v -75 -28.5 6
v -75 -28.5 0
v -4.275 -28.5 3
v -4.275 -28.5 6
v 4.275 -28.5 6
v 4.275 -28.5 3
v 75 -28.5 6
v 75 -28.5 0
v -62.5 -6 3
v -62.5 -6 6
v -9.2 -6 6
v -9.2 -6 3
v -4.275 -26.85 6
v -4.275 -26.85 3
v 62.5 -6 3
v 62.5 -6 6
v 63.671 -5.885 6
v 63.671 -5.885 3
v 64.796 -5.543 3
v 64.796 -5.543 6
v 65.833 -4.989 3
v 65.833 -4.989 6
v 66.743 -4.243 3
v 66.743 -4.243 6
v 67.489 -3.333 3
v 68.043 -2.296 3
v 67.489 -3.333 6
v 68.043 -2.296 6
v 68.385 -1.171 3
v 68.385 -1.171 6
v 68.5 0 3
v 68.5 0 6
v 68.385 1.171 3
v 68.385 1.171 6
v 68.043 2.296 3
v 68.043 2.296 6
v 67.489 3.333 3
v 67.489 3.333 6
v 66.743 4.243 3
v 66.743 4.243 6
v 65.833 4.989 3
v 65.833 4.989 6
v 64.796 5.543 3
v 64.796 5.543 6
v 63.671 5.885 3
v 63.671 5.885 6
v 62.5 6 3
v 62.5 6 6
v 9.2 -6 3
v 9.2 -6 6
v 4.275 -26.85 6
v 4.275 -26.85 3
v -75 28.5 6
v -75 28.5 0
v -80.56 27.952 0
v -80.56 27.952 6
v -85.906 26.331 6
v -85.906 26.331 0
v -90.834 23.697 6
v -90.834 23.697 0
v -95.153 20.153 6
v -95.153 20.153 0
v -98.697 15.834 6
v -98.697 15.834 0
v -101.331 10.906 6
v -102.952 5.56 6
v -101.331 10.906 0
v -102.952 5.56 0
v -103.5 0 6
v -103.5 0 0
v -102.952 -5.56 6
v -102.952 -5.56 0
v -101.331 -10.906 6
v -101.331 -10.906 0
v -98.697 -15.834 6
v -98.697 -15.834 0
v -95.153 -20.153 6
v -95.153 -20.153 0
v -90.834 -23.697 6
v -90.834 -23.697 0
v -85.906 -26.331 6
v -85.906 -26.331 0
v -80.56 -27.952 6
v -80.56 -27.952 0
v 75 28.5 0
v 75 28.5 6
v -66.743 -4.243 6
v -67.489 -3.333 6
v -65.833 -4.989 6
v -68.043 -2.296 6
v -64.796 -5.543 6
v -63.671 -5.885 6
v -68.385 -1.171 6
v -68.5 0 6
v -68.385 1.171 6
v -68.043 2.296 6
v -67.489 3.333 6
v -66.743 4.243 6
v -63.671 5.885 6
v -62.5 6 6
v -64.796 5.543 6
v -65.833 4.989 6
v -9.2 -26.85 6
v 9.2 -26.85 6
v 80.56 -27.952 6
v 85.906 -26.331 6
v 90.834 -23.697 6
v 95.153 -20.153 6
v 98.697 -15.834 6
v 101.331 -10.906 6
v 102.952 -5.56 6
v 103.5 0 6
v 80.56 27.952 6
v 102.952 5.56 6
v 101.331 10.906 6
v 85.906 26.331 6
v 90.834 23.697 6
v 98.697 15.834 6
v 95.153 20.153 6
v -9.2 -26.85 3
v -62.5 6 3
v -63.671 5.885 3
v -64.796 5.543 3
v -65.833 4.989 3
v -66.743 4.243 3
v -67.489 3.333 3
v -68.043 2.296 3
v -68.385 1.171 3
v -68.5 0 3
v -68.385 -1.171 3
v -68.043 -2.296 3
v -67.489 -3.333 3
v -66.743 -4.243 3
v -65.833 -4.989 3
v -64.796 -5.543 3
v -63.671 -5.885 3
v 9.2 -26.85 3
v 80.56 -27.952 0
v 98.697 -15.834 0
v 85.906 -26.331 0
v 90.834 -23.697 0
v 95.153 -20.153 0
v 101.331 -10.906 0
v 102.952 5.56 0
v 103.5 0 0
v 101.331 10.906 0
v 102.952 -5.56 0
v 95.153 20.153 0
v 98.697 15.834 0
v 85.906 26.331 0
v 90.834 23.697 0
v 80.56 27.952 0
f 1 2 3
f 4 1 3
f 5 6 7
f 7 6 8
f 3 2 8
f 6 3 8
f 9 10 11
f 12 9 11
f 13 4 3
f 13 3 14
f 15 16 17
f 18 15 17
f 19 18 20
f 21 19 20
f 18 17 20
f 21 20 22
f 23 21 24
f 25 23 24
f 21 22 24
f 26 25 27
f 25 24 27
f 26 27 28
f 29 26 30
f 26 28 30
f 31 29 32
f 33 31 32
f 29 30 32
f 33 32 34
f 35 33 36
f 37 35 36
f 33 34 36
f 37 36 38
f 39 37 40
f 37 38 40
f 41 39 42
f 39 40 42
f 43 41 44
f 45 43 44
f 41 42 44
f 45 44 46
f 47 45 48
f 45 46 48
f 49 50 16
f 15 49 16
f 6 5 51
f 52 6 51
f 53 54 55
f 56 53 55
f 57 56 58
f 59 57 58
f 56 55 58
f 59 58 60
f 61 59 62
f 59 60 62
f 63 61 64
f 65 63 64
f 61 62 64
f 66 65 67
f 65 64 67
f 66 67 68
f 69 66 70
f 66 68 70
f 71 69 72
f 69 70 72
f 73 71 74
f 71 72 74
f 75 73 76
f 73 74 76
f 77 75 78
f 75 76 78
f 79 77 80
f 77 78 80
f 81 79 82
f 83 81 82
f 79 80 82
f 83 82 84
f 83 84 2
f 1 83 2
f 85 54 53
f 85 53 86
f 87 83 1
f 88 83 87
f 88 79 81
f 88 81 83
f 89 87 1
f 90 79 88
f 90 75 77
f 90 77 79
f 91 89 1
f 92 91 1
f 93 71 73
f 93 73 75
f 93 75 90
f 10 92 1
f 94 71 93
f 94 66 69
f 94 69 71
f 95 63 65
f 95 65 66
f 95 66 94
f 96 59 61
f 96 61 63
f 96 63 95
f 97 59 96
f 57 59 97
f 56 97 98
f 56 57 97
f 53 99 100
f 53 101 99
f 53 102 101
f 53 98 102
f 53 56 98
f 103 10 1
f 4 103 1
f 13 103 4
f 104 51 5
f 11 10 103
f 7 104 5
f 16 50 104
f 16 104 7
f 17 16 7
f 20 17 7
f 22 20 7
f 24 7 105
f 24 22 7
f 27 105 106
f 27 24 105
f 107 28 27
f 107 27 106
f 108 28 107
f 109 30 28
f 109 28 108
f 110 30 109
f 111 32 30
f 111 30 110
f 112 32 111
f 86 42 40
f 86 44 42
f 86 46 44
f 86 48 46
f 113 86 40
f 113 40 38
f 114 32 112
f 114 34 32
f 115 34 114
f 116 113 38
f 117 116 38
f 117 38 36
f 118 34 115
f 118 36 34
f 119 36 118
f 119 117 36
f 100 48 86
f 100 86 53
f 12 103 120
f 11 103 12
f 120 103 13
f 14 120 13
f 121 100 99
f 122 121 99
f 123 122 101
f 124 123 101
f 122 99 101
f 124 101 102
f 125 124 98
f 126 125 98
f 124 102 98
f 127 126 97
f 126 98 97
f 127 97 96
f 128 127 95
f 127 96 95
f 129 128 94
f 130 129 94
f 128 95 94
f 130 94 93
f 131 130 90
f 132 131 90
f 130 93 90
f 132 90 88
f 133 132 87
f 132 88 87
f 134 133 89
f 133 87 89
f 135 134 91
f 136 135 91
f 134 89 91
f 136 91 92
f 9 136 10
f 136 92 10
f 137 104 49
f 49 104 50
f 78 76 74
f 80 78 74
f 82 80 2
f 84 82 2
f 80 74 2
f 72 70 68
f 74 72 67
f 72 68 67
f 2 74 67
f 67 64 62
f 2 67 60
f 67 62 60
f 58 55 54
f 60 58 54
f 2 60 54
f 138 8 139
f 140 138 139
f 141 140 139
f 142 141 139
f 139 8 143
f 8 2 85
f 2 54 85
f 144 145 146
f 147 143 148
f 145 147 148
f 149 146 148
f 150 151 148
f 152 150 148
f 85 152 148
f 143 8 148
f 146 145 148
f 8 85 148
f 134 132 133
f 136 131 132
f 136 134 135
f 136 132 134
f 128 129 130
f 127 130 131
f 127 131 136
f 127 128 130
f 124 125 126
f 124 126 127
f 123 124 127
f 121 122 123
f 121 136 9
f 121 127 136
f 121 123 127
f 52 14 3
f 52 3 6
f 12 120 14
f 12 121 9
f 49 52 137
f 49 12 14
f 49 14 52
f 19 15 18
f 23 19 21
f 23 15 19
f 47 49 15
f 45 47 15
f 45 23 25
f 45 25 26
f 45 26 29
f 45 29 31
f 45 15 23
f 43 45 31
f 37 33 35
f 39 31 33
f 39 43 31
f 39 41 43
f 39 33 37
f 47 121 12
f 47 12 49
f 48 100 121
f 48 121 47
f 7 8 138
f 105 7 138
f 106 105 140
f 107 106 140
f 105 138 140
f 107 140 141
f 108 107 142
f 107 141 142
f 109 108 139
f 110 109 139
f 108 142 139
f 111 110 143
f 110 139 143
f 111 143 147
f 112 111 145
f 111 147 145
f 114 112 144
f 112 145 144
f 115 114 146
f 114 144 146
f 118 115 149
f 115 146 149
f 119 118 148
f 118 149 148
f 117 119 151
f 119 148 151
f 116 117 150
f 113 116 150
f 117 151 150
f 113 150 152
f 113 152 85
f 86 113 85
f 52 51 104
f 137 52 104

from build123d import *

# Parameters (mm, degrees)
PAD_DEPTH       = 6
POCKET_DEPTH    = 3
SKETCH002_W     = 18.4
SKETCH002_H     = 20.85
POCKET001_DEPTH = 3
SKETCH003_W     = 8.55
SKETCH003_H     = 1.65
POCKET002_DEPTH = 3


with BuildPart() as part:
    # Sketch → Pad (new body)
    with BuildSketch(Plane.XY):
        with BuildLine():
            ThreePointArc((-75, 28.5), (-103.5, 0), (-75, -28.5))
            Line((-75, -28.5), (75, -28.5))
            ThreePointArc((75, -28.5), (103.5, 0), (75, 28.5))
            Line((-75, 28.5), (75, 28.5))
        make_face()
    extrude(amount=PAD_DEPTH)

    # Sketch001 (on Face6 of Pad) → Pocket (cut)
    with BuildSketch(Plane.XY.offset(6)):
        with BuildLine():
            ThreePointArc((-62.5, 6), (-68.5, 0), (-62.5, -6))
            Line((-62.5, -6), (62.5, -6))
            ThreePointArc((62.5, -6), (68.5, 0), (62.5, 6))
            Line((-62.5, 6), (62.5, 6))
        make_face()
    extrude(amount=-POCKET_DEPTH, mode=Mode.SUBTRACT)

    # Sketch002 (on Face5 of Pocket) → Pocket001 (cut)
    with BuildSketch(Plane.XY.offset(6)):
        with Locations((0, -16.425)):
            Rectangle(SKETCH002_W, SKETCH002_H)
    extrude(amount=-POCKET001_DEPTH, mode=Mode.SUBTRACT)

    # Sketch003 (on Face5 of Pocket001) → Pocket002 (cut)
    with BuildSketch(Plane.XY.offset(6)):
        with Locations((0, -27.675)):
            Rectangle(SKETCH003_W, SKETCH003_H)
    extrude(amount=-POCKET002_DEPTH, mode=Mode.SUBTRACT)


solid = part.part
